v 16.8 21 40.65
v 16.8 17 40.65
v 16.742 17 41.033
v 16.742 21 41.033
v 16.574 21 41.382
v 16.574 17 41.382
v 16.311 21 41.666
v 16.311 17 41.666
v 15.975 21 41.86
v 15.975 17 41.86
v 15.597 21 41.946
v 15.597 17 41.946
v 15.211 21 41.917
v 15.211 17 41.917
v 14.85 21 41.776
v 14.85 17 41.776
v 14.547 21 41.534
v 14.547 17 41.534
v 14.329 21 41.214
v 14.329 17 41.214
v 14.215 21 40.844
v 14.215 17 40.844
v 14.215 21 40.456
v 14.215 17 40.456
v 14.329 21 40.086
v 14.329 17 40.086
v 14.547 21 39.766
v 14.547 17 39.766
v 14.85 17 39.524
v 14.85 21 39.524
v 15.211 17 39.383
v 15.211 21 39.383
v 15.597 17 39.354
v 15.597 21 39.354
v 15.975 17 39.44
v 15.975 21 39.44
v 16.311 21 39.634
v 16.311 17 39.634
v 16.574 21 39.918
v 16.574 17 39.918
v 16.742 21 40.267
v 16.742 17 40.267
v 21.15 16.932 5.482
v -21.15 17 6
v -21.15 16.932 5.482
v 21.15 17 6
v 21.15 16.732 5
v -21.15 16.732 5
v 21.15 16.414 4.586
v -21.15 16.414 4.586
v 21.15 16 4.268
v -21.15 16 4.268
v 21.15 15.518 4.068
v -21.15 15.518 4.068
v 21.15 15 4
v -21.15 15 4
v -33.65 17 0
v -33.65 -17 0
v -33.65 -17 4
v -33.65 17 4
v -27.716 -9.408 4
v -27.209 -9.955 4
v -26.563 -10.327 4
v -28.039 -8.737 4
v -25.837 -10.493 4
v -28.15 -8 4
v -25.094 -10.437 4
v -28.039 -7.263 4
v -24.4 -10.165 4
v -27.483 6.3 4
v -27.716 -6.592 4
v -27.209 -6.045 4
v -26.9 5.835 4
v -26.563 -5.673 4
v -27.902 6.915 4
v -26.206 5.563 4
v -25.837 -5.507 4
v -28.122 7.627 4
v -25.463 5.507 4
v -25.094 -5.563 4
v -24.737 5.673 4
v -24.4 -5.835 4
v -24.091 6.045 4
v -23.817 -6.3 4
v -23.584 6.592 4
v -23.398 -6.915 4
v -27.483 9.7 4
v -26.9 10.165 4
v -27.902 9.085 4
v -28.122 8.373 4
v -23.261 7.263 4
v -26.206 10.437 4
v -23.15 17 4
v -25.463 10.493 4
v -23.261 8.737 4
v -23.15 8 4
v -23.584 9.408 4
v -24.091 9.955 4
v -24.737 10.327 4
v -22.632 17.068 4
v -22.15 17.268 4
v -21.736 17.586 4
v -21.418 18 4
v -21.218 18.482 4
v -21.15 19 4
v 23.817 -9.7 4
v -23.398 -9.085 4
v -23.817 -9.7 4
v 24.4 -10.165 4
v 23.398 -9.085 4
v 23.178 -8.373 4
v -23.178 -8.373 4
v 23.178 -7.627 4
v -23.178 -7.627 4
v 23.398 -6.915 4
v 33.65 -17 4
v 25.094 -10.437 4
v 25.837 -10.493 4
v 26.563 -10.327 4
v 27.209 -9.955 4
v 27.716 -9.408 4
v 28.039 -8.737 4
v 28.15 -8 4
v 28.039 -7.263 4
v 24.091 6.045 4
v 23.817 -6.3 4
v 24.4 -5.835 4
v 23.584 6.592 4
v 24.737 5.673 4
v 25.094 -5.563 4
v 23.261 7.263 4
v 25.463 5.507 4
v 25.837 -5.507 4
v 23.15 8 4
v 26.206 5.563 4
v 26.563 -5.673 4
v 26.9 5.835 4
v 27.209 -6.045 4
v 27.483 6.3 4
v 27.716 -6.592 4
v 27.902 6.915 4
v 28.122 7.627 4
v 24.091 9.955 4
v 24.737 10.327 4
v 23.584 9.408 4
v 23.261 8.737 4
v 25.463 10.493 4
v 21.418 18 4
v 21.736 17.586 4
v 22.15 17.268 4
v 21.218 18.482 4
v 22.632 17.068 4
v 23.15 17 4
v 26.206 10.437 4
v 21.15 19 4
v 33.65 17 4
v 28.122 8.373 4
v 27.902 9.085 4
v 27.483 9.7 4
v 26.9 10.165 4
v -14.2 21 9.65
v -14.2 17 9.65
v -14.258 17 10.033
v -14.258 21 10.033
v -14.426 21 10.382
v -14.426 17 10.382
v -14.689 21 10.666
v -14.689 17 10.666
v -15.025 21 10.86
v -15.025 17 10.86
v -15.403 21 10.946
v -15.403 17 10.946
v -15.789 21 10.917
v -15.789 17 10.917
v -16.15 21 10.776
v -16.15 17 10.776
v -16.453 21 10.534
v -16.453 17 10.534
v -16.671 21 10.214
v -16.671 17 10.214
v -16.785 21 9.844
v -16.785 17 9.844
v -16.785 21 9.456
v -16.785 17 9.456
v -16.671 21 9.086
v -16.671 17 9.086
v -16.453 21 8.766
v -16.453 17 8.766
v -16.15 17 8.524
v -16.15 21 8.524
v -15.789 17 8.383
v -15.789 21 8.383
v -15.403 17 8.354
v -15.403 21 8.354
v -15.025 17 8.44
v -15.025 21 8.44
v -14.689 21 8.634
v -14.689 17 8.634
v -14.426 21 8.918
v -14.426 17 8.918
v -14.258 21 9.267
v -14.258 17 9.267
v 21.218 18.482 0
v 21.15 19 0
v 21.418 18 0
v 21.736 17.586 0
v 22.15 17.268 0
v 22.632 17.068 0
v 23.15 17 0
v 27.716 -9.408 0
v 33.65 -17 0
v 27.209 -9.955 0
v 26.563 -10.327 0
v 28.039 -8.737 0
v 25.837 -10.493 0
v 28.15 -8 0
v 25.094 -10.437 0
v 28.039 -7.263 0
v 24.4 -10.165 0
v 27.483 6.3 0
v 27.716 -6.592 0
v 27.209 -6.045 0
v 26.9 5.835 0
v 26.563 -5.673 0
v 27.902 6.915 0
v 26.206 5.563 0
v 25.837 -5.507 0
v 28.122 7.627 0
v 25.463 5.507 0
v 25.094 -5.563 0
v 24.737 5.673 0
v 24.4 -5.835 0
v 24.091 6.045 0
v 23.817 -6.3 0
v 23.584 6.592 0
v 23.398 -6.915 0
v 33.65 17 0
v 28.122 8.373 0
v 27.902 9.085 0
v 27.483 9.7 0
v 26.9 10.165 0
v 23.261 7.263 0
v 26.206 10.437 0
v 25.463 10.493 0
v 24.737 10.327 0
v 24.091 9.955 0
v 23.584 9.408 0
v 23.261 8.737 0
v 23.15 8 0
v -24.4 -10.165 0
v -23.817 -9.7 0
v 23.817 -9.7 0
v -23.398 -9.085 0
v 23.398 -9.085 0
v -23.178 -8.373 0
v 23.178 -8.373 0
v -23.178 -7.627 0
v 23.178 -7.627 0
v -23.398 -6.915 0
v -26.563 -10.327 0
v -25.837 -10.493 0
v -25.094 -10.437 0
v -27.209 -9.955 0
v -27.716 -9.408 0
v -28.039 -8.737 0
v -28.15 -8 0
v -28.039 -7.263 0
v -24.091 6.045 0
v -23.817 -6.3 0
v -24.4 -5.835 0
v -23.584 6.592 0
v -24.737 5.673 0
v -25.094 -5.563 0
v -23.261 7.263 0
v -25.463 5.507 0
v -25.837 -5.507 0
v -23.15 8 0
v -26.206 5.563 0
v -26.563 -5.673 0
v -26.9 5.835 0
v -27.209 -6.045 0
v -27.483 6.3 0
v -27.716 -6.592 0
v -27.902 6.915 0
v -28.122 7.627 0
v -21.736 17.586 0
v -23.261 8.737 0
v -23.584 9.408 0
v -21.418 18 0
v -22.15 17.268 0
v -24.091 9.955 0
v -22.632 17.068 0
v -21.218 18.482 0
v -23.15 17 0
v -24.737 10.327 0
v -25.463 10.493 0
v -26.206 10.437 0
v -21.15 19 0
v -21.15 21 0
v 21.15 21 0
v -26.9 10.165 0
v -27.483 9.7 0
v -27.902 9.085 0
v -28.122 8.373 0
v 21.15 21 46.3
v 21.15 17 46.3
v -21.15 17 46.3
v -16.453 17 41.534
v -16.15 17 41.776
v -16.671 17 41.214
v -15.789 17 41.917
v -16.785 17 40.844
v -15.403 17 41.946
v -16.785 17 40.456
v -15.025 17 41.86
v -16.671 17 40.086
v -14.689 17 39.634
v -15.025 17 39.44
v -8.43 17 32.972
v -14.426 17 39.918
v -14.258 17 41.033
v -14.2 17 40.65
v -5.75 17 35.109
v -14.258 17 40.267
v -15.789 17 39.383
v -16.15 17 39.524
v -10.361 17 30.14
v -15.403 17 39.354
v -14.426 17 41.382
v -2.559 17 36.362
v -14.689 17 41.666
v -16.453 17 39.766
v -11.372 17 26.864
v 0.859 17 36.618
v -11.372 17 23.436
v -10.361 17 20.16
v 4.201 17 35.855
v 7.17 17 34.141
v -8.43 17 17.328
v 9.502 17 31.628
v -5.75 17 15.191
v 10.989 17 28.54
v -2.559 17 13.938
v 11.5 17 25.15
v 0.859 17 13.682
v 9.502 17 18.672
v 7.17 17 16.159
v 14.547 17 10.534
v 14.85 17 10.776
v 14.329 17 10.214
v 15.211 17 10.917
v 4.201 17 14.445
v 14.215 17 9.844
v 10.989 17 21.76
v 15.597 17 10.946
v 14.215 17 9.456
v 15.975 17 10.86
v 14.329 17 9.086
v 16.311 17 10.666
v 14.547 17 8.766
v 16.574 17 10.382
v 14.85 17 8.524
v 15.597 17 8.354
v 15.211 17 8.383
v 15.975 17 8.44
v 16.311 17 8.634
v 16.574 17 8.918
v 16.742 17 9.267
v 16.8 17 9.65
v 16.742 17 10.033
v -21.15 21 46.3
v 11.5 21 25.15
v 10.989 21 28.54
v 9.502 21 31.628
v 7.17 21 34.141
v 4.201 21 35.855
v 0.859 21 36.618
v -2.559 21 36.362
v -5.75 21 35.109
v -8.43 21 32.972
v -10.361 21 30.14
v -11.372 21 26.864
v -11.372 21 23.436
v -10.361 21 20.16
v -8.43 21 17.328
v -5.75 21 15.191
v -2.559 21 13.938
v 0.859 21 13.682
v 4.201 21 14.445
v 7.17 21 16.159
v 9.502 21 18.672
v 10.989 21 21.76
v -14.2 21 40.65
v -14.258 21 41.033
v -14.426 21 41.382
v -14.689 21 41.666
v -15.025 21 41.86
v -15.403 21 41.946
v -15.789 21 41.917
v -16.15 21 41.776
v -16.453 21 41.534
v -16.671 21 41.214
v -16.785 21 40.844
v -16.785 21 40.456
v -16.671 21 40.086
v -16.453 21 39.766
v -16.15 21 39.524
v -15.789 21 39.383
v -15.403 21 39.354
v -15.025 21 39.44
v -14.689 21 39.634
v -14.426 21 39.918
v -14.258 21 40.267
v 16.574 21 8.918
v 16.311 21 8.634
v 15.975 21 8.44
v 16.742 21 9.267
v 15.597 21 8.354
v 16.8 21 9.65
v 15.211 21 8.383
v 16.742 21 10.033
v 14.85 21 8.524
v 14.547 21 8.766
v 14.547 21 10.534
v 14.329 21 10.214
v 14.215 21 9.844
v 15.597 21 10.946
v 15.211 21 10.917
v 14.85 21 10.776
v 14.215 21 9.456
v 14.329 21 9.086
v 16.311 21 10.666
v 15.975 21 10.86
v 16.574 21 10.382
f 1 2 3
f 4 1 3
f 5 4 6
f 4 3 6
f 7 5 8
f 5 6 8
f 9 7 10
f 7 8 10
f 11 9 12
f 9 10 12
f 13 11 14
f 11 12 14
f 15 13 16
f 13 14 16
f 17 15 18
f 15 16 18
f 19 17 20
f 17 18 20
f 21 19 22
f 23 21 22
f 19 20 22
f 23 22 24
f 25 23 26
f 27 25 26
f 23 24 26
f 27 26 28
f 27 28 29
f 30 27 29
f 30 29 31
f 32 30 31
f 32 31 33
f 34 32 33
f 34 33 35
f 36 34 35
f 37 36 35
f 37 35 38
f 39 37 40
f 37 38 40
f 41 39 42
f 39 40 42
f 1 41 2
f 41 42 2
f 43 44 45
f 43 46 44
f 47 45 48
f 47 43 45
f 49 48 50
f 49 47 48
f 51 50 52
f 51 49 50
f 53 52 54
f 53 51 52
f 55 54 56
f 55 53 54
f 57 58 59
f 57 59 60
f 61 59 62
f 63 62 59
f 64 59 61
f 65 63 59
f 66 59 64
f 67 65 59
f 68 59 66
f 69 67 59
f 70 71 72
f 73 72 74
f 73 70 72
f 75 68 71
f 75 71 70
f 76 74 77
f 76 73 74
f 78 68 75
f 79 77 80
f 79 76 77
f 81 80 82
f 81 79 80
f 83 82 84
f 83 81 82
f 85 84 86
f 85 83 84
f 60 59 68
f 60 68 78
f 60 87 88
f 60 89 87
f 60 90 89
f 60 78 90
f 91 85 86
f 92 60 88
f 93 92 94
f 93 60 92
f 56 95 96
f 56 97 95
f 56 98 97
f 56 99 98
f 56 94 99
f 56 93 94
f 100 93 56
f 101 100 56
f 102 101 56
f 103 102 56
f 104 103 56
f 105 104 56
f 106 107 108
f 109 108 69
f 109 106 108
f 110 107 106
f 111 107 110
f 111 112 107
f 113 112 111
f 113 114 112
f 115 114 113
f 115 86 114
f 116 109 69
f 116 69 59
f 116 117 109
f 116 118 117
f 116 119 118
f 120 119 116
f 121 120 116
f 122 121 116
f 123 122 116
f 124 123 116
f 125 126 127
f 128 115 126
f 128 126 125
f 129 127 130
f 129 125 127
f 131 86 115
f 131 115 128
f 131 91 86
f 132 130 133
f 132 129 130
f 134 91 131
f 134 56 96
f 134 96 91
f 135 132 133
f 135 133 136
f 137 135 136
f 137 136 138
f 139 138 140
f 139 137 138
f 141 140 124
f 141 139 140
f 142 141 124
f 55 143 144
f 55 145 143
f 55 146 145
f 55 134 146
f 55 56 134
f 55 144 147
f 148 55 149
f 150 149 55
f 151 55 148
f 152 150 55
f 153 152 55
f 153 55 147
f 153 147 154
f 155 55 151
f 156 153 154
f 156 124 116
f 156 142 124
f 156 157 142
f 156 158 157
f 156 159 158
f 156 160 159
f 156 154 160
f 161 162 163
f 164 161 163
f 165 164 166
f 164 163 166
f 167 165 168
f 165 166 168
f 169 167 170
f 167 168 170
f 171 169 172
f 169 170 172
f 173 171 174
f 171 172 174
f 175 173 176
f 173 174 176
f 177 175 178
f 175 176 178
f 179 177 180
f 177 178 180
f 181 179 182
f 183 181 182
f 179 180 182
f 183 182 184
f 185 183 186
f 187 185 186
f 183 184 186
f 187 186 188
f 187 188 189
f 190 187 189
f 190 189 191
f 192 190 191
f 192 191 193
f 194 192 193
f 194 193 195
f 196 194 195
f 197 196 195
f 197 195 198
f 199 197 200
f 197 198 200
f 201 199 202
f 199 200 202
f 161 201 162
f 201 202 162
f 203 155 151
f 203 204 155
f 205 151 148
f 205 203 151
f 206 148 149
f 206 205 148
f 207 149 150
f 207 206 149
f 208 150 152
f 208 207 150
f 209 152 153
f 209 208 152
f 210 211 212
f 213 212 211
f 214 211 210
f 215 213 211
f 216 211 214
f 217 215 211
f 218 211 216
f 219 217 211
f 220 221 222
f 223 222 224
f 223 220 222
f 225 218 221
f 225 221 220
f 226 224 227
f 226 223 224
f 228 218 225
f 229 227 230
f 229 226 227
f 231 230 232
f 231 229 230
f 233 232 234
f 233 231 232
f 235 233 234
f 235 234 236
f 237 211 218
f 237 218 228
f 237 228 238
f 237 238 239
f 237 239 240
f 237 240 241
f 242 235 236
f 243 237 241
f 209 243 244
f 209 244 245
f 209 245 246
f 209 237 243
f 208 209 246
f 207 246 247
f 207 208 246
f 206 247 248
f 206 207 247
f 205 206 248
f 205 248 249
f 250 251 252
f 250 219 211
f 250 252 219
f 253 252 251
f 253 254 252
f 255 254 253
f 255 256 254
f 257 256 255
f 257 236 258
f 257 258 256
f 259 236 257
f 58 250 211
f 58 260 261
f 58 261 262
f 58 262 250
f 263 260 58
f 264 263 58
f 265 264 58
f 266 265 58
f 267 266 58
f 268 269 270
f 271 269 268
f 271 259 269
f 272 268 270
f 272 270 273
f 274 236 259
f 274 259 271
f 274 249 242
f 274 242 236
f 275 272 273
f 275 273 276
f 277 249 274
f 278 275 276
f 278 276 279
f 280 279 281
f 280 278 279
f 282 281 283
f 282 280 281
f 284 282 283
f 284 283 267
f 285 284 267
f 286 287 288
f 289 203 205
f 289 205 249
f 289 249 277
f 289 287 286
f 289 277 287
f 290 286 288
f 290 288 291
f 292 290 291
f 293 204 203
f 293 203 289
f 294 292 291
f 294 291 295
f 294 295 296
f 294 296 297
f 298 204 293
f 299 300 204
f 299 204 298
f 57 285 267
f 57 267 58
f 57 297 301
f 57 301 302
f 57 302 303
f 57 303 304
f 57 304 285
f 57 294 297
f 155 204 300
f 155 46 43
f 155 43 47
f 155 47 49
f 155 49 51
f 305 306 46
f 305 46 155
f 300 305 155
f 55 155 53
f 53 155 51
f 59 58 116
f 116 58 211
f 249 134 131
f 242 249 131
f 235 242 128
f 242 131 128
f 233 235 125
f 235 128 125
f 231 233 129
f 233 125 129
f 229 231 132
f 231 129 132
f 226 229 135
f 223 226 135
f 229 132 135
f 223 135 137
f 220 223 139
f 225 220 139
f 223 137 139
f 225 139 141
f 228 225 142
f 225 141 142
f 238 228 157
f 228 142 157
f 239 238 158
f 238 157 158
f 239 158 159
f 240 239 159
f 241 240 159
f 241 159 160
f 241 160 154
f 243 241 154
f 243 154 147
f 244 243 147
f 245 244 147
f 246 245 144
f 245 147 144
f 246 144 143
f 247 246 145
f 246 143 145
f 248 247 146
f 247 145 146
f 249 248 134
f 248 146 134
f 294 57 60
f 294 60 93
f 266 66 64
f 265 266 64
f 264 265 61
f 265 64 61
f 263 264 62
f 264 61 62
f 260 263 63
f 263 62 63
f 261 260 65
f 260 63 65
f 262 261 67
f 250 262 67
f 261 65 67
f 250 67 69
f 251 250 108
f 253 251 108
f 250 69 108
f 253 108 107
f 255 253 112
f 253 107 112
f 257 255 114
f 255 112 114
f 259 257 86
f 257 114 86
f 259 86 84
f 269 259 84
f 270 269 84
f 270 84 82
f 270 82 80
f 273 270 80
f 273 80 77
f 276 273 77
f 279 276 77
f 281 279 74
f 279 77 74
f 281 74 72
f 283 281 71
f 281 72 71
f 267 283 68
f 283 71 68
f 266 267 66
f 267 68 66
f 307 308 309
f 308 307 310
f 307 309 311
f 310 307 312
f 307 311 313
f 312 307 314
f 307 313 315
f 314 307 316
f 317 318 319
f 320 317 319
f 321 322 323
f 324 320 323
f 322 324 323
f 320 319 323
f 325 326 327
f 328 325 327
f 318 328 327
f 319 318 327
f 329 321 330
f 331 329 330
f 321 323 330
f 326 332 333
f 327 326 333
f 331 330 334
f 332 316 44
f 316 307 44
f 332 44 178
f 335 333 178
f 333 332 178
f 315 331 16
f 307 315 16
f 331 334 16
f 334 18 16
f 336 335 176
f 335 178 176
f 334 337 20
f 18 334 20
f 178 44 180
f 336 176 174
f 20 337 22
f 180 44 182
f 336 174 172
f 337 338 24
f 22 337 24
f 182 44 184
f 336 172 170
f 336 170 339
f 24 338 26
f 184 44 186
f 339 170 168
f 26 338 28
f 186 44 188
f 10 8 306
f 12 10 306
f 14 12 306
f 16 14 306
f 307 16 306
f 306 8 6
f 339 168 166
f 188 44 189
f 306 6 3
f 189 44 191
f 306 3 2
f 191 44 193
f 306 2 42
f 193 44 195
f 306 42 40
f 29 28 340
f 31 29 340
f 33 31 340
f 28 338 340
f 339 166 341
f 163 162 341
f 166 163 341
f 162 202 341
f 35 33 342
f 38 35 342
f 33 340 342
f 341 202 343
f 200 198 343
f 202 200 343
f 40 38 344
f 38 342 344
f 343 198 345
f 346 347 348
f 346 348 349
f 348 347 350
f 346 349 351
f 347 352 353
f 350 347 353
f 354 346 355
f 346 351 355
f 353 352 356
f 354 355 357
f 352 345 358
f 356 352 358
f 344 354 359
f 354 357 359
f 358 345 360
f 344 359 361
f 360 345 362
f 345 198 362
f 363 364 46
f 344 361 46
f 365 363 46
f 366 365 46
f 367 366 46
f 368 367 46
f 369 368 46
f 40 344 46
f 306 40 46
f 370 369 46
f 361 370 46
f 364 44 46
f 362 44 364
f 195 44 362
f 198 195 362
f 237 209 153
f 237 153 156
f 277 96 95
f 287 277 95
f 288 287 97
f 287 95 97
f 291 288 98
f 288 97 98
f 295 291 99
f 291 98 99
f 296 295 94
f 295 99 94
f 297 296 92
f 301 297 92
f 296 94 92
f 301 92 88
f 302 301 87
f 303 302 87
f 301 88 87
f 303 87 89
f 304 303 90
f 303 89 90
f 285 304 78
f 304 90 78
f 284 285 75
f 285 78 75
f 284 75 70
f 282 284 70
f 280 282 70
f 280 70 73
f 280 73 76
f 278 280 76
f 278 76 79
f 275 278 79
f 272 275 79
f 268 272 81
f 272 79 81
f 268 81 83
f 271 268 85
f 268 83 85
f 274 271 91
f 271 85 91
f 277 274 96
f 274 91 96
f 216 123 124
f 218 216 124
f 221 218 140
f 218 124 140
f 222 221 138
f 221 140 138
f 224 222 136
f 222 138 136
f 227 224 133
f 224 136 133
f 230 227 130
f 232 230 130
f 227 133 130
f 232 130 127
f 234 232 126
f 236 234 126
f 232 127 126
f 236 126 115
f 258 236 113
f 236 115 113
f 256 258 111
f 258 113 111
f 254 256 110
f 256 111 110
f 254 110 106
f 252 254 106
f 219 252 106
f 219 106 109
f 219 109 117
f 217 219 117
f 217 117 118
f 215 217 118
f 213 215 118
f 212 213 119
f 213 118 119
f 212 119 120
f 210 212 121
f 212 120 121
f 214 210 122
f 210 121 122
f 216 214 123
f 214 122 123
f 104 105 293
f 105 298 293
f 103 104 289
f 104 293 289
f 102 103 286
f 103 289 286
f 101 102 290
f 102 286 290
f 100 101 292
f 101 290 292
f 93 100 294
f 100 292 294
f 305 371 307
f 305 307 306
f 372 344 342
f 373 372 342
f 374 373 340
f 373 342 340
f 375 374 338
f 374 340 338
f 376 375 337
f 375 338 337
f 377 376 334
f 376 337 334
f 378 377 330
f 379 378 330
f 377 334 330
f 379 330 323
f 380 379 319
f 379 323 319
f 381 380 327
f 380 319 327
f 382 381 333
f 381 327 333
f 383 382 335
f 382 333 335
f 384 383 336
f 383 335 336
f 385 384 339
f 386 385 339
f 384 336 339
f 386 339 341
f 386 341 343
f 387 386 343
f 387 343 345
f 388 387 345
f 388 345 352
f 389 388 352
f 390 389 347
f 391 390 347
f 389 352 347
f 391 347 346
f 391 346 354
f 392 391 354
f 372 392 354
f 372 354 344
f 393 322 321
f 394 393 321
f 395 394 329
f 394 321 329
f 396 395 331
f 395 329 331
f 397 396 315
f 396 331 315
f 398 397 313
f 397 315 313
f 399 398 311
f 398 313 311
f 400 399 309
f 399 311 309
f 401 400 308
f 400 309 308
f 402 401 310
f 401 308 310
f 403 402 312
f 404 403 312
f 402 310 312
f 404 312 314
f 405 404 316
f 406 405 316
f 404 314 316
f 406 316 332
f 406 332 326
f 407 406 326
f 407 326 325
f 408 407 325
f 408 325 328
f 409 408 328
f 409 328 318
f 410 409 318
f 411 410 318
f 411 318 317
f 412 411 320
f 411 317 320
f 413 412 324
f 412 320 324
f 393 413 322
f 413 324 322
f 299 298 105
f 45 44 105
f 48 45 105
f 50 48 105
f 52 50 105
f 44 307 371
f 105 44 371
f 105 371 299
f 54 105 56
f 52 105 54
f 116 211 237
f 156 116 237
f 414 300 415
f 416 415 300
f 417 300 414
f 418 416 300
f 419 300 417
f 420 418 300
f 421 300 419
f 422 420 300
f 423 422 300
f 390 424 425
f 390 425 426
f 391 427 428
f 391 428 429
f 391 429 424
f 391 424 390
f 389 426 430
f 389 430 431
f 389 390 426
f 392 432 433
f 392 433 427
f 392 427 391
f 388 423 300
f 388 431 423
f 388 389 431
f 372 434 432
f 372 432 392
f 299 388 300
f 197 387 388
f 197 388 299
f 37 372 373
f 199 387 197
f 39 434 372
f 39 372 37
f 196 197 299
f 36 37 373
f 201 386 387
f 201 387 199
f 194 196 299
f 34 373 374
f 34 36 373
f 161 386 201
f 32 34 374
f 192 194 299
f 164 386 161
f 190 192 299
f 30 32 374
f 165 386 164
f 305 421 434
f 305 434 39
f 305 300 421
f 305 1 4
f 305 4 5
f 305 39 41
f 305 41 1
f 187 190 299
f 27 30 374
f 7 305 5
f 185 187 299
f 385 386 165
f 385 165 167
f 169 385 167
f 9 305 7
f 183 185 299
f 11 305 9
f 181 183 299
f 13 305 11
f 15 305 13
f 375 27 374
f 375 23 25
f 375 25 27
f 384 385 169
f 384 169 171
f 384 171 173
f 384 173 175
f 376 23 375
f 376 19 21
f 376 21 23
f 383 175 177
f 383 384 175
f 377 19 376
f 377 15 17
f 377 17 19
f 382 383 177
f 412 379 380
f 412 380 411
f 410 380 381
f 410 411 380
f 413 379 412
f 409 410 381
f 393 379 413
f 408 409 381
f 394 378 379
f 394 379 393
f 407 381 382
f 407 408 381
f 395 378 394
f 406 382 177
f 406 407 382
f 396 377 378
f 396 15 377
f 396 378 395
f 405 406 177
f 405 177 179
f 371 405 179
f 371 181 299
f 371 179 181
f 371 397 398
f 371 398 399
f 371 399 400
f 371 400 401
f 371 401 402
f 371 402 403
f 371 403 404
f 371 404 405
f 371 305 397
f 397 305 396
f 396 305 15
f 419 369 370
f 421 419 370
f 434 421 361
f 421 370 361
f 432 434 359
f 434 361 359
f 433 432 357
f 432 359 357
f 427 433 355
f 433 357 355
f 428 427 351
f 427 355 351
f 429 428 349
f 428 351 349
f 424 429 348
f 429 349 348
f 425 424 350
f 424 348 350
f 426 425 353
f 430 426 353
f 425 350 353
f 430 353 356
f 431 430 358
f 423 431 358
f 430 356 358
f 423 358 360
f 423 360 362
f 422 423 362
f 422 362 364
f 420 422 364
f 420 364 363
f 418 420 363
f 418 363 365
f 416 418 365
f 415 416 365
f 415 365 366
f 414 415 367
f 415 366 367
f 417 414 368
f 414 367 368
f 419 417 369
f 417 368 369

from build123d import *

# Parameters (mm, degrees)
SKETCH_1_W          = 67.3
SKETCH_1_H          = 34
EXTRUDE_1_DEPTH     = 4
SKETCH_2_W          = 21.15
SKETCH_2_H          = 4
EXTRUDE_2_DEPTH     = 42.3
SKETCH_3_W          = 42.3
SKETCH_3_H          = 4
EXTRUDE_3_DEPTH     = 4
FILLET_1_R          = 2
FILLET_2_R          = 2
SKETCH_4_R          = 1.3
SKETCH_4_R_2        = 11.5
CUT_EXTRUDE_1_DEPTH = 4
SKETCH_5_R          = 2.5
CUT_EXTRUDE_2_DEPTH = 4


with BuildPart() as part:
    # 草图1 → 凸台-拉伸1 (new body)
    with BuildSketch(Plane.XY):
        Rectangle(SKETCH_1_W, SKETCH_1_H)
    extrude(amount=EXTRUDE_1_DEPTH)



with BuildPart() as body_2:
    # 草图2 → 凸台-拉伸2 (new body)
    with BuildSketch(Plane.XY.offset(4)):
        with Locations((-10.575, 19)):
            Rectangle(SKETCH_2_W, SKETCH_2_H)
        with Locations((10.575, 19)):
            Rectangle(SKETCH_2_W, SKETCH_2_H)
    extrude(amount=EXTRUDE_2_DEPTH)


with BuildPart() as part_1:
    add(part.part)

    add(body_2.part)  # 凸台-拉伸3 merges body 2
    # 草图3 → 凸台-拉伸3 (add)
    with BuildSketch(Plane(origin=(0, 0, 4), x_dir=(-1, 0, 0), z_dir=(0, 0, -1))):
        with Locations((0, 19)):
            Rectangle(SKETCH_3_W, SKETCH_3_H)
    extrude(amount=EXTRUDE_3_DEPTH)

    # 圆角1
    fillet_1_edges = [part_1.edges().sort_by_distance(p)[0] for p in [
        (0, 17, 4),
    ]]
    fillet(fillet_1_edges, radius=FILLET_1_R)

    # 圆角2
    fillet_2_edges = [part_1.edges().sort_by_distance(p)[0] for p in [
        (-21.15, 17, 2),
        (21.15, 17, 2),
    ]]
    fillet(fillet_2_edges, radius=FILLET_2_R)

    # 草图4 → 切除-拉伸1 (cut)
    with BuildSketch(Plane.XZ.offset(-17)):
        with Locations((-15.5, 40.65)):
            Circle(SKETCH_4_R)
        with Locations((15.5, 40.65)):
            Circle(SKETCH_4_R)
        with Locations((-15.5, 9.65)):
            Circle(SKETCH_4_R)
        with Locations((15.5, 9.65)):
            Circle(SKETCH_4_R)
        with Locations((0, 25.15)):
            Circle(SKETCH_4_R_2)
    extrude(amount=-CUT_EXTRUDE_1_DEPTH, mode=Mode.SUBTRACT)

    # 草图5 → 切除-拉伸2 (cut)
    with BuildSketch(Plane.XY.offset(4)):
        with Locations((-25.65, 8)):
            Circle(SKETCH_5_R)
        with Locations(Location((-25.65, -8, 0), (0, 0, 180))):
            Circle(SKETCH_5_R)
        with Locations(Location((25.65, 8, 0), (0, 0, 180))):
            Circle(SKETCH_5_R)
        with Locations((25.65, -8)):
            Circle(SKETCH_5_R)
    extrude(amount=-CUT_EXTRUDE_2_DEPTH, mode=Mode.SUBTRACT)


solid = part_1.part
